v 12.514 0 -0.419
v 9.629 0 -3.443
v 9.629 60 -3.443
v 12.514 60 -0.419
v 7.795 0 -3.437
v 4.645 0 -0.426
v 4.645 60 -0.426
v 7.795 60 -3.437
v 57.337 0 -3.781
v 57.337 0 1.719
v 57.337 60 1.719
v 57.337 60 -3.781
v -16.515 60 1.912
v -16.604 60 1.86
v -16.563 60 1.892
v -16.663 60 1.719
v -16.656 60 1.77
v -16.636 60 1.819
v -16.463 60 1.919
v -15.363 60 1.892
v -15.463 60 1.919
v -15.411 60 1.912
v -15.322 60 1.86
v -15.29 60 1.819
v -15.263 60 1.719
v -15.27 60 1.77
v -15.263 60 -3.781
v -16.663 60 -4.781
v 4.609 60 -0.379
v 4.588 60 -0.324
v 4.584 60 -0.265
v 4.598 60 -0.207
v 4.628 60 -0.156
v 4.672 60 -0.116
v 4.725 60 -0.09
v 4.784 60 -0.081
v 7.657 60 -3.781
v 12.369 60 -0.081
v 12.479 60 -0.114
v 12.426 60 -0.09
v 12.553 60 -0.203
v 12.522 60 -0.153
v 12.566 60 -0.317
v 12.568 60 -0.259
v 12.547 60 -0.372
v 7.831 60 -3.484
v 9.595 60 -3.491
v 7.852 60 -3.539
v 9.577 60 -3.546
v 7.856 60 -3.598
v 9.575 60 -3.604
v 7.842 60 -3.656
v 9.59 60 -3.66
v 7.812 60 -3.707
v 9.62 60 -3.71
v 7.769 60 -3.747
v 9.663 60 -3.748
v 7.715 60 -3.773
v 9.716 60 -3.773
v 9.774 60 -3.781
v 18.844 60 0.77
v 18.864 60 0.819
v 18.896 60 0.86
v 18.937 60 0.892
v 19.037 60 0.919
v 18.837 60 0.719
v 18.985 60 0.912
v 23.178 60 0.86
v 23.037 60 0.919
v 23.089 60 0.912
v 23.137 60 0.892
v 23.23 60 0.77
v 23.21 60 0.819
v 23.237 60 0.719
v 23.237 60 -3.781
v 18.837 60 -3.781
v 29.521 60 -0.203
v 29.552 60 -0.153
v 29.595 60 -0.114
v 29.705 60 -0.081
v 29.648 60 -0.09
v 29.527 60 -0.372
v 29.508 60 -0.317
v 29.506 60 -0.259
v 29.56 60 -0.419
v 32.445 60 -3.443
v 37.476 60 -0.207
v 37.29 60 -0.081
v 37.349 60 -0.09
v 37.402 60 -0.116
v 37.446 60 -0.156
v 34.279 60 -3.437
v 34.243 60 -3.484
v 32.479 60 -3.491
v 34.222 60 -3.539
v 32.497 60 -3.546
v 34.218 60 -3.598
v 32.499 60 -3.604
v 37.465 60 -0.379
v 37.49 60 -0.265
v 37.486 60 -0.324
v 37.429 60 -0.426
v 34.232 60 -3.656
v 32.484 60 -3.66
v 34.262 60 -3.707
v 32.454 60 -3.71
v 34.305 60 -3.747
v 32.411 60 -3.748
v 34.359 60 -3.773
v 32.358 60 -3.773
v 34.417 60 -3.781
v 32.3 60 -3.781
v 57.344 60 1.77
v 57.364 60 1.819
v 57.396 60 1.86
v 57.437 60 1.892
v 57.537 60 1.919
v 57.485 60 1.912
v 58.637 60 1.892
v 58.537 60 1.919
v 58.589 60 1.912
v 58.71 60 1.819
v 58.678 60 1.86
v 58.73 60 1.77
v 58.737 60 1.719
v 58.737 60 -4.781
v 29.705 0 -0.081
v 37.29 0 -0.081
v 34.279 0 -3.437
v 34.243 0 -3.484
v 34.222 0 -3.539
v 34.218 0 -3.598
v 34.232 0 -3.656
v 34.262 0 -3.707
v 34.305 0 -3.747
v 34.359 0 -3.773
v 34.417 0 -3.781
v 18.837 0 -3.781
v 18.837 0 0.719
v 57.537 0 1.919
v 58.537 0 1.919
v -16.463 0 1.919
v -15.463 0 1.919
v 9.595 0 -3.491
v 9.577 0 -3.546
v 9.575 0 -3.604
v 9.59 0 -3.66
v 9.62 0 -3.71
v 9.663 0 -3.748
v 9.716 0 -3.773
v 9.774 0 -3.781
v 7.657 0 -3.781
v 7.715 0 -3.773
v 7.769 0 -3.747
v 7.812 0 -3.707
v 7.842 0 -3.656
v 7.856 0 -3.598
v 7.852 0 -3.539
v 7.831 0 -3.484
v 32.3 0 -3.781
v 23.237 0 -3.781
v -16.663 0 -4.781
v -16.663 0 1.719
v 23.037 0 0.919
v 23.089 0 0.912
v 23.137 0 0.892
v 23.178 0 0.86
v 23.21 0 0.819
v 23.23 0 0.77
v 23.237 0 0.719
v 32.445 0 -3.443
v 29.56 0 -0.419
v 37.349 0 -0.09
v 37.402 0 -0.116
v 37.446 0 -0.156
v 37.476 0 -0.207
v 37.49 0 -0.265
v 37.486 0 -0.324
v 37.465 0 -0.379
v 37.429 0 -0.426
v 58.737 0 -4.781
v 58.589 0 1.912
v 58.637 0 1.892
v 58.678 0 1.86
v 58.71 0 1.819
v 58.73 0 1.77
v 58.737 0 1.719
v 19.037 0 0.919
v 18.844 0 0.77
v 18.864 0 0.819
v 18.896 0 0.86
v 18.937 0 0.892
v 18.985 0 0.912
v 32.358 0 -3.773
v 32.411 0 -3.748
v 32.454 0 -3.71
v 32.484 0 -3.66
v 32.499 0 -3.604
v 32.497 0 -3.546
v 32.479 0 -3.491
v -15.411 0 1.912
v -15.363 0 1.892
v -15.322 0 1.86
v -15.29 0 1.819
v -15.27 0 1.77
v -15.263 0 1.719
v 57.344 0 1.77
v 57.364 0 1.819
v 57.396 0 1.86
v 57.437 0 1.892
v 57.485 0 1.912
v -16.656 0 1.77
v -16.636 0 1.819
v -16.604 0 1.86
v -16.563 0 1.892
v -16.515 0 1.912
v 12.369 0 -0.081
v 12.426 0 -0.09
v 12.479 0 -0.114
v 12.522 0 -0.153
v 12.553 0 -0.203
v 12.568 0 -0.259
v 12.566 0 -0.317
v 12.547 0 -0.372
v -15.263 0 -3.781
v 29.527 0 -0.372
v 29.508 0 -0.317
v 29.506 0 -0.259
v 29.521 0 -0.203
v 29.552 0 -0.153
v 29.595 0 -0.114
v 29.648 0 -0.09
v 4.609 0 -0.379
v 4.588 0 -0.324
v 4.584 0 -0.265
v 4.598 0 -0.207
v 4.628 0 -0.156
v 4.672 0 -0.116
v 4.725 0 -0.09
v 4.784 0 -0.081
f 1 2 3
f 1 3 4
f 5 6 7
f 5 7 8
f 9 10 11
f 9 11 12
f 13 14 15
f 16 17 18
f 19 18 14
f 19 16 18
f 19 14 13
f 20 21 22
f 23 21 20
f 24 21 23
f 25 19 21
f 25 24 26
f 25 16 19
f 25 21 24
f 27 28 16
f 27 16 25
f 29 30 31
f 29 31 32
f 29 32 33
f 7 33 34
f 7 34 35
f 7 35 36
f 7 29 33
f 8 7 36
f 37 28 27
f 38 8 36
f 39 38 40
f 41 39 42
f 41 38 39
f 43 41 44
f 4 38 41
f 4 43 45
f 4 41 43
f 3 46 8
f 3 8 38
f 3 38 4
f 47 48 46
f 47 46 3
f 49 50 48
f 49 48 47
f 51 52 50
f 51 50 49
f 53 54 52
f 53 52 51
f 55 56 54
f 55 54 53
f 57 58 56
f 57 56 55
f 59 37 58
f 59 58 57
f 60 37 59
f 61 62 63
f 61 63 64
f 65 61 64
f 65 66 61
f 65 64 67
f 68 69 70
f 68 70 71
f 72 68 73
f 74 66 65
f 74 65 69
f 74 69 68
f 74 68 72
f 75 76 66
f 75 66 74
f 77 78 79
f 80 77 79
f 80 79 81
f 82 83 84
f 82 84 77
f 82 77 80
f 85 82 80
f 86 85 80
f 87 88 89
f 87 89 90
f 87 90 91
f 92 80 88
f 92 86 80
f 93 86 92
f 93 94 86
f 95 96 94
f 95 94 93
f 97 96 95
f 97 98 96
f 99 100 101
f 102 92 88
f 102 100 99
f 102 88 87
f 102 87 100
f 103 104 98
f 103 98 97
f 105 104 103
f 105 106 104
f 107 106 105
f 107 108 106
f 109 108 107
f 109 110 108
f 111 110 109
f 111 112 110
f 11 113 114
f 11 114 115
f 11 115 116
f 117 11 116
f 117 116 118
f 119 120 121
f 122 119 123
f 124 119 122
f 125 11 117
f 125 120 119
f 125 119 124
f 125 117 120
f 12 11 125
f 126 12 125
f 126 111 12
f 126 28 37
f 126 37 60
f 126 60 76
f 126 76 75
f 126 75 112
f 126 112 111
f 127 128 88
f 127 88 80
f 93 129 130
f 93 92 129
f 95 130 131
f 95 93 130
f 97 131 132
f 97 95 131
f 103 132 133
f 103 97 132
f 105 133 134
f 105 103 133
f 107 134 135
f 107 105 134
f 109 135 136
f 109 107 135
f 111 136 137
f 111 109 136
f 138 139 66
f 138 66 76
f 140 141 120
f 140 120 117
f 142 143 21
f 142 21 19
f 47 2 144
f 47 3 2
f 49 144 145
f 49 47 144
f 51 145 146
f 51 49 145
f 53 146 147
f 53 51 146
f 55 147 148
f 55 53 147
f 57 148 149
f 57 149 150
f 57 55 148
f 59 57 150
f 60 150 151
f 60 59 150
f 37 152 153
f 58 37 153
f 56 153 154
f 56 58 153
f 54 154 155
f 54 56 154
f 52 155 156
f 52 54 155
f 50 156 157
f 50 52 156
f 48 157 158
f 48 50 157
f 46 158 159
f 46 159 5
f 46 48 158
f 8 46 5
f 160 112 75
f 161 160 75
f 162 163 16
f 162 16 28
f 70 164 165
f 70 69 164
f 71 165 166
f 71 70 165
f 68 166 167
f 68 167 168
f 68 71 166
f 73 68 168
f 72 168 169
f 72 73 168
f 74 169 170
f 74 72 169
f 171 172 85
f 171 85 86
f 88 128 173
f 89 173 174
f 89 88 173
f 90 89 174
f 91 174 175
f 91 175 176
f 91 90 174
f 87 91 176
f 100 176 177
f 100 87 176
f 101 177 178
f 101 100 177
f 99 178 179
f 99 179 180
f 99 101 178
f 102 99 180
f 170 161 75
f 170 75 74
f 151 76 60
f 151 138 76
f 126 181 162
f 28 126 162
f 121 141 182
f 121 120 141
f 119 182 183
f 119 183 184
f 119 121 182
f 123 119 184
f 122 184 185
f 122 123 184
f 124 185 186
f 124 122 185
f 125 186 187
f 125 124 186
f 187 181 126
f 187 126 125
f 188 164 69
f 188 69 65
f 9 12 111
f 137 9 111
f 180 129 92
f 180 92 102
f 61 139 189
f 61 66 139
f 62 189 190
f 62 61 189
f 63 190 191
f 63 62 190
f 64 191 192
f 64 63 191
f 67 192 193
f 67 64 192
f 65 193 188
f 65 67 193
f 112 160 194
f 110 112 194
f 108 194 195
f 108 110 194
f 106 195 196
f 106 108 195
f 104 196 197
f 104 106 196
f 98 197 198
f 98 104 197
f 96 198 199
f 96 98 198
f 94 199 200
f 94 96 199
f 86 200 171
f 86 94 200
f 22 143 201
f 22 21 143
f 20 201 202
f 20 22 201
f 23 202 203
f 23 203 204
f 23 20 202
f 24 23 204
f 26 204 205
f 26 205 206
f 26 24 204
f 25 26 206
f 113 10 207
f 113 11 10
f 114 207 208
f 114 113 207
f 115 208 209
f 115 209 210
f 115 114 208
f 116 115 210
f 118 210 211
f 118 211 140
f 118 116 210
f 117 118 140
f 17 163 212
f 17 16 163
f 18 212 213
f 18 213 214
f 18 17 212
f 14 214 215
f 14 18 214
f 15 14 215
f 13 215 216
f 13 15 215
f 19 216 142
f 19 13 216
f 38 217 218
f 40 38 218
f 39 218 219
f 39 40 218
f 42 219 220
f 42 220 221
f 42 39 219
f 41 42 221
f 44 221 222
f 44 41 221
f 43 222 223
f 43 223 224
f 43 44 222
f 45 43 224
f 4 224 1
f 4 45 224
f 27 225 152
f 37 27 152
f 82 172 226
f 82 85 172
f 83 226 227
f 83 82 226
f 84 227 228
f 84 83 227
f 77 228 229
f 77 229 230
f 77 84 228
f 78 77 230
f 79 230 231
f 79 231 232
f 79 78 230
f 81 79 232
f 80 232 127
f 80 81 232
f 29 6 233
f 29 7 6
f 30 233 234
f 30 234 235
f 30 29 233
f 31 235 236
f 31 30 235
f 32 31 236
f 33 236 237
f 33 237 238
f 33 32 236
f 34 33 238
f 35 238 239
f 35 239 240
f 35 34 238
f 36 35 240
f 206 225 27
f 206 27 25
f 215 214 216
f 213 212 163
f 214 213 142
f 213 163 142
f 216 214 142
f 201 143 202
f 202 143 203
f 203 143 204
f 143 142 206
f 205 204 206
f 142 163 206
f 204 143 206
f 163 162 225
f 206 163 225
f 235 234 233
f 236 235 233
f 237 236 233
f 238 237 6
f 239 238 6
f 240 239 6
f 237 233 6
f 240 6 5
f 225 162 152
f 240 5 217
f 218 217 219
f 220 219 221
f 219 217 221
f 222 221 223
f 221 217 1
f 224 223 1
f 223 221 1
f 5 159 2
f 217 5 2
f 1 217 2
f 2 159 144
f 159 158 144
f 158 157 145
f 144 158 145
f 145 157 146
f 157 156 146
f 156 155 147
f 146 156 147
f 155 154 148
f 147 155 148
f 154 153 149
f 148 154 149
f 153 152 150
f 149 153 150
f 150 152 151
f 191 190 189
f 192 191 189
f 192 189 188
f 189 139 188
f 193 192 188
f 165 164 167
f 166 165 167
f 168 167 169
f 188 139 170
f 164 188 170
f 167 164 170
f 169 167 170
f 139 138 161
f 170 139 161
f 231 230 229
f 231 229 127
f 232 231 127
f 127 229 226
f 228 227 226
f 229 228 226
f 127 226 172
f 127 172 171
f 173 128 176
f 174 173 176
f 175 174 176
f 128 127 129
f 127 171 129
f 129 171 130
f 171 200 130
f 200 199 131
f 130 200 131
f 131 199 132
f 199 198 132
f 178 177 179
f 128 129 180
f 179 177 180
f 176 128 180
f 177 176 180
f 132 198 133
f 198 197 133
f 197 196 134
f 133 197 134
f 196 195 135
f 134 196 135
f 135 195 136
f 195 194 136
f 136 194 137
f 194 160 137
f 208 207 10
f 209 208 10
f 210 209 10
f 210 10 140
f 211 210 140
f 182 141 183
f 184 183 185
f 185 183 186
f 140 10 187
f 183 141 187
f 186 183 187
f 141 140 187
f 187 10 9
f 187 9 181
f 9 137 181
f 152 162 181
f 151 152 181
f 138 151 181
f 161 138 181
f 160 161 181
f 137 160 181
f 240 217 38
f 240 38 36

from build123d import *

# Parameters (mm, degrees)
BOSS_EXTRUDE1_DEPTH = 60
MOVE_FACE1_DEPTH    = 60
FILLET1_R           = 0.2


# Read off the part's stored shape, not the designer's step: Move Face1
with BuildPart() as part:
    # Sketch1 → Boss-Extrude1 (new body)
    with BuildSketch(Plane(origin=(0, 0, 0), x_dir=(1, 0, 0), z_dir=(0, 1, 0))):
        Polygon((7.721033882, 3.781430367), (3.536999802, -0.218569633), (13.536999802, -0.218569633), (9.721033882, 3.781430367), (18.536999802, 3.781430367), (18.536999802, -1.218569633), (23.536999802, -1.218569633), (23.536999802, 3.781430367), (32.352965722, 3.781430367), (28.536999802, -0.218569633), (38.536999802, -0.218569633), (34.352965722, 3.781430367), (57.036999802, 3.781430367), (57.036999802, -2.218569633), (59.036999802, -2.218569633), (59.036999802, 3.781430367), (59.036999802, 4.781430367), (-16.963000198, 4.781430367), (-16.963000198, 3.781430367), (-16.963000198, -2.218569633), (-14.963000198, -2.218569633), (-14.963000198, 3.781430367), align=None)
    extrude(amount=BOSS_EXTRUDE1_DEPTH)

    # Move Face1 outline → Move Face1 (cut)
    with BuildSketch(Plane(origin=(0, 0, 0), x_dir=(1, 0, 0), z_dir=(0, 1, 0))):
        Polygon((12.836183283, 0.081430367), (4.284936029, 0.081430367), (8.155167552, 3.781430367), (7.721033882, 3.781430367), (3.536999802, -0.218569633), (13.536999802, -0.218569633), (9.721033882, 3.781430367), (9.306414807, 3.781430367), align=None)
        Polygon((-14.963000198, -2.218569633), (-14.963000198, 3.781430367), (-15.263000198, 3.781430367), (-15.263000198, -1.918569633), (-16.663000198, -1.918569633), (-16.663000198, 4.781430367), (-16.963000198, 4.781430367), (-16.963000198, -2.218569633), align=None)
        Polygon((18.836999802, 3.781430367), (18.536999802, 3.781430367), (18.536999802, -1.218569633), (23.536999802, -1.218569633), (23.536999802, 3.781430367), (23.236999802, 3.781430367), (23.236999802, -0.918569633), (18.836999802, -0.918569633), align=None)
        Polygon((59.036999802, 4.781430367), (58.736999802, 4.781430367), (58.736999802, -1.918569633), (57.336999802, -1.918569633), (57.336999802, 3.781430367), (57.036999802, 3.781430367), (57.036999802, -2.218569633), (59.036999802, -2.218569633), align=None)
        Polygon((32.767584796, 3.781430367), (32.352965722, 3.781430367), (28.536999802, -0.218569633), (38.536999802, -0.218569633), (34.352965722, 3.781430367), (33.918832051, 3.781430367), (37.789063575, 0.081430367), (29.23781632, 0.081430367), align=None)
    extrude(amount=MOVE_FACE1_DEPTH, mode=Mode.SUBTRACT)

    # Fillet1
    fillet1_edges = [part.edges().sort_by_distance(p)[0] for p in [
        (-15.263000198, 30, 1.918569633),
        (-16.663000198, 30, 1.918569633),
        (58.736999802, 30, 1.918569633),
        (57.336999802, 30, 1.918569633),
        (33.918832051, 30, -3.781430367),
        (37.789063575, 30, -0.081430367),
        (29.23781632, 30, -0.081430367),
        (32.767584796, 30, -3.781430367),
        (23.236999802, 30, 0.918569633),
        (18.836999802, 30, 0.918569633),
        (9.306414807, 30, -3.781430367),
        (12.836183283, 30, -0.081430367),
        (4.284936029, 30, -0.081430367),
        (8.155167552, 30, -3.781430367),
    ]]
    fillet(fillet1_edges, radius=FILLET1_R)


solid = part.part
